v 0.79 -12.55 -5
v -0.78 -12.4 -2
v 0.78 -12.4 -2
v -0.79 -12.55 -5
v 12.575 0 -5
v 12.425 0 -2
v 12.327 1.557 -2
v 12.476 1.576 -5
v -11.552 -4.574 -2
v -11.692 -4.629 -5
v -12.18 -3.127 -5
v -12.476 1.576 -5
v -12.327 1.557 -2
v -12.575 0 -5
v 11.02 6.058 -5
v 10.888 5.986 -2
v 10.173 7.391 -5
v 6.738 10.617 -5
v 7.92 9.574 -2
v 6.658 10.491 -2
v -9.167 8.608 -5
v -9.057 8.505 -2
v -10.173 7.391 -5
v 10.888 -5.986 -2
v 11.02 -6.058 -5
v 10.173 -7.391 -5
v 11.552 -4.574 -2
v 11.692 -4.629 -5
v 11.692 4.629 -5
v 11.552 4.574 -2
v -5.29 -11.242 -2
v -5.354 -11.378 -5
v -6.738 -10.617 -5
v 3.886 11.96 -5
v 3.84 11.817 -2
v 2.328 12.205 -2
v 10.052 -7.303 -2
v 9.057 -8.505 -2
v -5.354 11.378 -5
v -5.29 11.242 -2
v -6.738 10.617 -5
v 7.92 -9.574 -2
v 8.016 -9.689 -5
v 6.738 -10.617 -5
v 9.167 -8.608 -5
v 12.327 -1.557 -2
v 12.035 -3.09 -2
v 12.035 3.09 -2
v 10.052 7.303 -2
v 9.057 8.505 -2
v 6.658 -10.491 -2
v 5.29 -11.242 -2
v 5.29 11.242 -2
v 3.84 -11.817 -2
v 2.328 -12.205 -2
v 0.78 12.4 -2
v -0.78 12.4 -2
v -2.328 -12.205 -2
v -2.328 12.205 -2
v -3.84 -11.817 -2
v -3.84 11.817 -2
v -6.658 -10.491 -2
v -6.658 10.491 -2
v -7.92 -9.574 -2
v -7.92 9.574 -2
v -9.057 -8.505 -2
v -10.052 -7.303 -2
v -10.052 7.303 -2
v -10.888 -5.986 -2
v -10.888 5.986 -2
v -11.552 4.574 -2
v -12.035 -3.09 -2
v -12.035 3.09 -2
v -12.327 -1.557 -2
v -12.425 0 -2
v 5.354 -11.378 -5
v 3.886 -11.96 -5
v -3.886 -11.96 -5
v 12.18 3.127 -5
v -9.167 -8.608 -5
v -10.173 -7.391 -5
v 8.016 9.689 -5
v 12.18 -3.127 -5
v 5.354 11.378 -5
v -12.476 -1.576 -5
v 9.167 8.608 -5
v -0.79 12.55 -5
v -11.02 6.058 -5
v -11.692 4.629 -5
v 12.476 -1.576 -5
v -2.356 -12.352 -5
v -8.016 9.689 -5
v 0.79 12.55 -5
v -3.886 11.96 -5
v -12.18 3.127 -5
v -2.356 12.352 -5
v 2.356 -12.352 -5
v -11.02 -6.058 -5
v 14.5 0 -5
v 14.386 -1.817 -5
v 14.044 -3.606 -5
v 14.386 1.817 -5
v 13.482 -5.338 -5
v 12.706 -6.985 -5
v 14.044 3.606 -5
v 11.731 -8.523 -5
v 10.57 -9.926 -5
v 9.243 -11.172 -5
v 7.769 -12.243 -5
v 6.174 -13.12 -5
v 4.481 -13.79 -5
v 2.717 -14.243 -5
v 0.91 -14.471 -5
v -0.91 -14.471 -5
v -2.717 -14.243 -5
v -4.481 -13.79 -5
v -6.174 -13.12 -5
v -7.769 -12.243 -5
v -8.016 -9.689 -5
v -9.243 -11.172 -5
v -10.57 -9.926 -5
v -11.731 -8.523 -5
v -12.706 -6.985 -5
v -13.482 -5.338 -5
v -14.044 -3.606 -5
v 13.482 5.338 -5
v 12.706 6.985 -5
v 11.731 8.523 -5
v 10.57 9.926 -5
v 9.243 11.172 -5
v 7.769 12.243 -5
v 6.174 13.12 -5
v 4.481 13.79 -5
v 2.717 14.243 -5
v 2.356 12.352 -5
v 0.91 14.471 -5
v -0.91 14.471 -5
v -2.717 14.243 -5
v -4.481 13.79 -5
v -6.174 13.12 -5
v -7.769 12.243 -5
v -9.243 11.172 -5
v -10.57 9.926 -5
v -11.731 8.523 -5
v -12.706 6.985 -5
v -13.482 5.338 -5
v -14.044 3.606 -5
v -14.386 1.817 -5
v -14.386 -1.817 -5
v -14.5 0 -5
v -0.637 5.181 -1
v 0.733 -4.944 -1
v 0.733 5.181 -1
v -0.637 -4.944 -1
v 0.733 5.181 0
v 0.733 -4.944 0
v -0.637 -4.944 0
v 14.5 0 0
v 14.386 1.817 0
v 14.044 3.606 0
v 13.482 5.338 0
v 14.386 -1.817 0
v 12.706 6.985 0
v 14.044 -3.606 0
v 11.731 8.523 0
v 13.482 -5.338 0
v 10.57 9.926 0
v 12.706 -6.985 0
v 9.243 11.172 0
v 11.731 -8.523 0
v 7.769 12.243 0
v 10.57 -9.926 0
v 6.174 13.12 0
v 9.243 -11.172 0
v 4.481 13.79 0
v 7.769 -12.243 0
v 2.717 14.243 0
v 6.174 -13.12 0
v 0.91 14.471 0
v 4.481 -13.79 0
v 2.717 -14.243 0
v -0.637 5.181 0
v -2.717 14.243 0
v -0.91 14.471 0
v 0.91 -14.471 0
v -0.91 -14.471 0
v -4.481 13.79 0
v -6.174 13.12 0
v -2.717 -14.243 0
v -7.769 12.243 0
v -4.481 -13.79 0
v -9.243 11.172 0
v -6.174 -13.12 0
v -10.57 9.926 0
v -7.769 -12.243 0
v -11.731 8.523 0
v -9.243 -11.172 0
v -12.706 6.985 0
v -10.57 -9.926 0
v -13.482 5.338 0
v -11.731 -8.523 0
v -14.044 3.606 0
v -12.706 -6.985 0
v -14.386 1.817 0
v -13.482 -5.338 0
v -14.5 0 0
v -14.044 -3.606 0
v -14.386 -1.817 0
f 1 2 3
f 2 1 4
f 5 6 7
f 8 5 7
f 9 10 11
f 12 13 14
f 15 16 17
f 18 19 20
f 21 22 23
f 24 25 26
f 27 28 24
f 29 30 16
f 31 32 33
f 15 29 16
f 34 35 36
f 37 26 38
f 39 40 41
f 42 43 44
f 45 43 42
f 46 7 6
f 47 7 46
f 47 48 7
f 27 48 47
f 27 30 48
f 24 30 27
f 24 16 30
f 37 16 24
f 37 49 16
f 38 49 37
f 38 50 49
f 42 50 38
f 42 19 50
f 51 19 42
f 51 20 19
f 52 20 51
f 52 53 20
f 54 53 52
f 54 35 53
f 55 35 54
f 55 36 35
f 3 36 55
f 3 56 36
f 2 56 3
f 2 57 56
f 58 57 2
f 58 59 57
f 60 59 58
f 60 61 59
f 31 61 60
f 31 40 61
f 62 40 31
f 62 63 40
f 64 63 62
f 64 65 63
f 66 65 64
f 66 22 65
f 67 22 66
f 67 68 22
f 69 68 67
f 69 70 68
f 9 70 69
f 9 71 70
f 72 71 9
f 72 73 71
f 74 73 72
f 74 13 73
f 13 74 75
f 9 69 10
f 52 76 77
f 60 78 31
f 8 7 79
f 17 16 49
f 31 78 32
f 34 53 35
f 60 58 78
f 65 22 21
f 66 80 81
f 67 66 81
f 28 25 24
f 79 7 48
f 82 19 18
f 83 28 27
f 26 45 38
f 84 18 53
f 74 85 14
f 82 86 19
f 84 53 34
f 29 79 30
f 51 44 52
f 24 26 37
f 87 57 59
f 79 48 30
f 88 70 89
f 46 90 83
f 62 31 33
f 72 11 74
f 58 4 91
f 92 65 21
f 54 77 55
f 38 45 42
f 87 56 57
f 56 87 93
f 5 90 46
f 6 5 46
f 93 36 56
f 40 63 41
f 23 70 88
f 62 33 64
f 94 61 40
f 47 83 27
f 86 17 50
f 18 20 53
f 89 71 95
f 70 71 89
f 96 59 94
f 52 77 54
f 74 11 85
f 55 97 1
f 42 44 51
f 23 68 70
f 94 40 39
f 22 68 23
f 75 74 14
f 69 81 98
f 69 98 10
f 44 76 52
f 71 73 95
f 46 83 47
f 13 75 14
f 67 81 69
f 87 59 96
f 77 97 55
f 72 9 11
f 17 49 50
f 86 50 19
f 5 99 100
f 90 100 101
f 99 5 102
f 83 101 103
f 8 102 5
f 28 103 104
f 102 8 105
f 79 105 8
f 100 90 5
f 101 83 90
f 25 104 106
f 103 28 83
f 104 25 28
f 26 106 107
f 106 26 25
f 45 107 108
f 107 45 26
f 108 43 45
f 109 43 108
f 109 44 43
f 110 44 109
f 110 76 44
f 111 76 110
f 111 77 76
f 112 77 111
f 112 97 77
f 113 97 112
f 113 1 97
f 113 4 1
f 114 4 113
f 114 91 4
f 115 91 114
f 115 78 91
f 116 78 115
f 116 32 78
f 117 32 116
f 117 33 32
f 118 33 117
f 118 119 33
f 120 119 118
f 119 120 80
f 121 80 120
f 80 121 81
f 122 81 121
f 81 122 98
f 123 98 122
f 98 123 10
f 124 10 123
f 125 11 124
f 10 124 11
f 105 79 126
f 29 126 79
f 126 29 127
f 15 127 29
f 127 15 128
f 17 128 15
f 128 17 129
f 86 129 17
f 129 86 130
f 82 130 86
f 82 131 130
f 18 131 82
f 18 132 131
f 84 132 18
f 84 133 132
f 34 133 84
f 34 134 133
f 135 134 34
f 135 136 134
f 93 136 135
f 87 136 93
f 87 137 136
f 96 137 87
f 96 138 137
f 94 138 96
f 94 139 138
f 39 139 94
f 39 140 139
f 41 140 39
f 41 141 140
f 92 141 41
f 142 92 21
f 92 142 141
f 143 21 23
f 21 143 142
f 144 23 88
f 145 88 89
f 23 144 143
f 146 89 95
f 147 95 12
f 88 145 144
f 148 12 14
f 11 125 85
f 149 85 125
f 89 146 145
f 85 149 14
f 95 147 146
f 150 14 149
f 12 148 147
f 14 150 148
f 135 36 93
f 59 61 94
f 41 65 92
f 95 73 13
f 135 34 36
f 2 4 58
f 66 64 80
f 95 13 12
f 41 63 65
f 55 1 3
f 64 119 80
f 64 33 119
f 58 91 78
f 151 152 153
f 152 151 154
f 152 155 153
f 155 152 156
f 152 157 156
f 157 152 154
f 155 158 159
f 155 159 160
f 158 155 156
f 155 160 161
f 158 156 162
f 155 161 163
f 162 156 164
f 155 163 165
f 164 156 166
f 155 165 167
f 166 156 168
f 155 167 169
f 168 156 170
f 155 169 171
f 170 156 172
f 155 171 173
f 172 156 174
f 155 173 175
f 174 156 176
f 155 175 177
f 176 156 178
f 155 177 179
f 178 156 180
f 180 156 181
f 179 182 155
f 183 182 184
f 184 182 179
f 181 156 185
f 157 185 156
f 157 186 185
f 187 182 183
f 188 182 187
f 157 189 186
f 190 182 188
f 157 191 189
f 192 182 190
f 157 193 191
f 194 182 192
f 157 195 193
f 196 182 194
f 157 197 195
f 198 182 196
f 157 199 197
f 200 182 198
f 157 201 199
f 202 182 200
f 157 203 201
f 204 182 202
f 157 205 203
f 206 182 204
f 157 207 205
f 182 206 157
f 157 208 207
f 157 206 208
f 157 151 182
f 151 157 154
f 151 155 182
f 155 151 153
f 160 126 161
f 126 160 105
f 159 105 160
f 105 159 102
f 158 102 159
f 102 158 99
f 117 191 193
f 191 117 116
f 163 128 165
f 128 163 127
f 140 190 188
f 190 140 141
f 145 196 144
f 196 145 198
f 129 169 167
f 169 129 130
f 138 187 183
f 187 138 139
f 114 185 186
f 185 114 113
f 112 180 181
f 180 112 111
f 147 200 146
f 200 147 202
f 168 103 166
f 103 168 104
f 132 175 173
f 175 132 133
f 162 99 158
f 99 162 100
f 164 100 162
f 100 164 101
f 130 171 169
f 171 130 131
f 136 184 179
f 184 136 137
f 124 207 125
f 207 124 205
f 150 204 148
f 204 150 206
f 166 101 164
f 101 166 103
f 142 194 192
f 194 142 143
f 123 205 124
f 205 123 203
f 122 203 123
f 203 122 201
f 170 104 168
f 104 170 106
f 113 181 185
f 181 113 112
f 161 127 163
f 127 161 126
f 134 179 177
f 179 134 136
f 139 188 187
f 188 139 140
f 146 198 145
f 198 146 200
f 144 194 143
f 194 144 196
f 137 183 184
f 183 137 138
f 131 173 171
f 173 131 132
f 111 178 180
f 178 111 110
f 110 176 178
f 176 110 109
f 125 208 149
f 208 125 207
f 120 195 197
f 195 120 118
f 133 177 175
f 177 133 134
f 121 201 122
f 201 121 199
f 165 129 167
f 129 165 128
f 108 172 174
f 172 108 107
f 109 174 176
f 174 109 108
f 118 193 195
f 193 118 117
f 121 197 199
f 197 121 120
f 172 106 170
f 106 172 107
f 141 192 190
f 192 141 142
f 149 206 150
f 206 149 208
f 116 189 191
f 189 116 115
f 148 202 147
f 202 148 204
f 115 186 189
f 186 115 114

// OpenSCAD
$fn = 50;

difference() {
	union() {
		translate(v = [0, 0, -5.0]) {
			cylinder(h = 5, r = 14.5);
		}
	}
	union() {
		#translate(v = [0, 0, -5.0]) {
			cylinder(h = 3, r1 = 12.575, r2 = 12.425);
		}
		translate(v = [0, 0, -1]) {
			linear_extrude(height = 1) {
				text(font = "Impact", halign = "center", size = 10, text = "I", valign = "center");
			}
		}
	}
}
